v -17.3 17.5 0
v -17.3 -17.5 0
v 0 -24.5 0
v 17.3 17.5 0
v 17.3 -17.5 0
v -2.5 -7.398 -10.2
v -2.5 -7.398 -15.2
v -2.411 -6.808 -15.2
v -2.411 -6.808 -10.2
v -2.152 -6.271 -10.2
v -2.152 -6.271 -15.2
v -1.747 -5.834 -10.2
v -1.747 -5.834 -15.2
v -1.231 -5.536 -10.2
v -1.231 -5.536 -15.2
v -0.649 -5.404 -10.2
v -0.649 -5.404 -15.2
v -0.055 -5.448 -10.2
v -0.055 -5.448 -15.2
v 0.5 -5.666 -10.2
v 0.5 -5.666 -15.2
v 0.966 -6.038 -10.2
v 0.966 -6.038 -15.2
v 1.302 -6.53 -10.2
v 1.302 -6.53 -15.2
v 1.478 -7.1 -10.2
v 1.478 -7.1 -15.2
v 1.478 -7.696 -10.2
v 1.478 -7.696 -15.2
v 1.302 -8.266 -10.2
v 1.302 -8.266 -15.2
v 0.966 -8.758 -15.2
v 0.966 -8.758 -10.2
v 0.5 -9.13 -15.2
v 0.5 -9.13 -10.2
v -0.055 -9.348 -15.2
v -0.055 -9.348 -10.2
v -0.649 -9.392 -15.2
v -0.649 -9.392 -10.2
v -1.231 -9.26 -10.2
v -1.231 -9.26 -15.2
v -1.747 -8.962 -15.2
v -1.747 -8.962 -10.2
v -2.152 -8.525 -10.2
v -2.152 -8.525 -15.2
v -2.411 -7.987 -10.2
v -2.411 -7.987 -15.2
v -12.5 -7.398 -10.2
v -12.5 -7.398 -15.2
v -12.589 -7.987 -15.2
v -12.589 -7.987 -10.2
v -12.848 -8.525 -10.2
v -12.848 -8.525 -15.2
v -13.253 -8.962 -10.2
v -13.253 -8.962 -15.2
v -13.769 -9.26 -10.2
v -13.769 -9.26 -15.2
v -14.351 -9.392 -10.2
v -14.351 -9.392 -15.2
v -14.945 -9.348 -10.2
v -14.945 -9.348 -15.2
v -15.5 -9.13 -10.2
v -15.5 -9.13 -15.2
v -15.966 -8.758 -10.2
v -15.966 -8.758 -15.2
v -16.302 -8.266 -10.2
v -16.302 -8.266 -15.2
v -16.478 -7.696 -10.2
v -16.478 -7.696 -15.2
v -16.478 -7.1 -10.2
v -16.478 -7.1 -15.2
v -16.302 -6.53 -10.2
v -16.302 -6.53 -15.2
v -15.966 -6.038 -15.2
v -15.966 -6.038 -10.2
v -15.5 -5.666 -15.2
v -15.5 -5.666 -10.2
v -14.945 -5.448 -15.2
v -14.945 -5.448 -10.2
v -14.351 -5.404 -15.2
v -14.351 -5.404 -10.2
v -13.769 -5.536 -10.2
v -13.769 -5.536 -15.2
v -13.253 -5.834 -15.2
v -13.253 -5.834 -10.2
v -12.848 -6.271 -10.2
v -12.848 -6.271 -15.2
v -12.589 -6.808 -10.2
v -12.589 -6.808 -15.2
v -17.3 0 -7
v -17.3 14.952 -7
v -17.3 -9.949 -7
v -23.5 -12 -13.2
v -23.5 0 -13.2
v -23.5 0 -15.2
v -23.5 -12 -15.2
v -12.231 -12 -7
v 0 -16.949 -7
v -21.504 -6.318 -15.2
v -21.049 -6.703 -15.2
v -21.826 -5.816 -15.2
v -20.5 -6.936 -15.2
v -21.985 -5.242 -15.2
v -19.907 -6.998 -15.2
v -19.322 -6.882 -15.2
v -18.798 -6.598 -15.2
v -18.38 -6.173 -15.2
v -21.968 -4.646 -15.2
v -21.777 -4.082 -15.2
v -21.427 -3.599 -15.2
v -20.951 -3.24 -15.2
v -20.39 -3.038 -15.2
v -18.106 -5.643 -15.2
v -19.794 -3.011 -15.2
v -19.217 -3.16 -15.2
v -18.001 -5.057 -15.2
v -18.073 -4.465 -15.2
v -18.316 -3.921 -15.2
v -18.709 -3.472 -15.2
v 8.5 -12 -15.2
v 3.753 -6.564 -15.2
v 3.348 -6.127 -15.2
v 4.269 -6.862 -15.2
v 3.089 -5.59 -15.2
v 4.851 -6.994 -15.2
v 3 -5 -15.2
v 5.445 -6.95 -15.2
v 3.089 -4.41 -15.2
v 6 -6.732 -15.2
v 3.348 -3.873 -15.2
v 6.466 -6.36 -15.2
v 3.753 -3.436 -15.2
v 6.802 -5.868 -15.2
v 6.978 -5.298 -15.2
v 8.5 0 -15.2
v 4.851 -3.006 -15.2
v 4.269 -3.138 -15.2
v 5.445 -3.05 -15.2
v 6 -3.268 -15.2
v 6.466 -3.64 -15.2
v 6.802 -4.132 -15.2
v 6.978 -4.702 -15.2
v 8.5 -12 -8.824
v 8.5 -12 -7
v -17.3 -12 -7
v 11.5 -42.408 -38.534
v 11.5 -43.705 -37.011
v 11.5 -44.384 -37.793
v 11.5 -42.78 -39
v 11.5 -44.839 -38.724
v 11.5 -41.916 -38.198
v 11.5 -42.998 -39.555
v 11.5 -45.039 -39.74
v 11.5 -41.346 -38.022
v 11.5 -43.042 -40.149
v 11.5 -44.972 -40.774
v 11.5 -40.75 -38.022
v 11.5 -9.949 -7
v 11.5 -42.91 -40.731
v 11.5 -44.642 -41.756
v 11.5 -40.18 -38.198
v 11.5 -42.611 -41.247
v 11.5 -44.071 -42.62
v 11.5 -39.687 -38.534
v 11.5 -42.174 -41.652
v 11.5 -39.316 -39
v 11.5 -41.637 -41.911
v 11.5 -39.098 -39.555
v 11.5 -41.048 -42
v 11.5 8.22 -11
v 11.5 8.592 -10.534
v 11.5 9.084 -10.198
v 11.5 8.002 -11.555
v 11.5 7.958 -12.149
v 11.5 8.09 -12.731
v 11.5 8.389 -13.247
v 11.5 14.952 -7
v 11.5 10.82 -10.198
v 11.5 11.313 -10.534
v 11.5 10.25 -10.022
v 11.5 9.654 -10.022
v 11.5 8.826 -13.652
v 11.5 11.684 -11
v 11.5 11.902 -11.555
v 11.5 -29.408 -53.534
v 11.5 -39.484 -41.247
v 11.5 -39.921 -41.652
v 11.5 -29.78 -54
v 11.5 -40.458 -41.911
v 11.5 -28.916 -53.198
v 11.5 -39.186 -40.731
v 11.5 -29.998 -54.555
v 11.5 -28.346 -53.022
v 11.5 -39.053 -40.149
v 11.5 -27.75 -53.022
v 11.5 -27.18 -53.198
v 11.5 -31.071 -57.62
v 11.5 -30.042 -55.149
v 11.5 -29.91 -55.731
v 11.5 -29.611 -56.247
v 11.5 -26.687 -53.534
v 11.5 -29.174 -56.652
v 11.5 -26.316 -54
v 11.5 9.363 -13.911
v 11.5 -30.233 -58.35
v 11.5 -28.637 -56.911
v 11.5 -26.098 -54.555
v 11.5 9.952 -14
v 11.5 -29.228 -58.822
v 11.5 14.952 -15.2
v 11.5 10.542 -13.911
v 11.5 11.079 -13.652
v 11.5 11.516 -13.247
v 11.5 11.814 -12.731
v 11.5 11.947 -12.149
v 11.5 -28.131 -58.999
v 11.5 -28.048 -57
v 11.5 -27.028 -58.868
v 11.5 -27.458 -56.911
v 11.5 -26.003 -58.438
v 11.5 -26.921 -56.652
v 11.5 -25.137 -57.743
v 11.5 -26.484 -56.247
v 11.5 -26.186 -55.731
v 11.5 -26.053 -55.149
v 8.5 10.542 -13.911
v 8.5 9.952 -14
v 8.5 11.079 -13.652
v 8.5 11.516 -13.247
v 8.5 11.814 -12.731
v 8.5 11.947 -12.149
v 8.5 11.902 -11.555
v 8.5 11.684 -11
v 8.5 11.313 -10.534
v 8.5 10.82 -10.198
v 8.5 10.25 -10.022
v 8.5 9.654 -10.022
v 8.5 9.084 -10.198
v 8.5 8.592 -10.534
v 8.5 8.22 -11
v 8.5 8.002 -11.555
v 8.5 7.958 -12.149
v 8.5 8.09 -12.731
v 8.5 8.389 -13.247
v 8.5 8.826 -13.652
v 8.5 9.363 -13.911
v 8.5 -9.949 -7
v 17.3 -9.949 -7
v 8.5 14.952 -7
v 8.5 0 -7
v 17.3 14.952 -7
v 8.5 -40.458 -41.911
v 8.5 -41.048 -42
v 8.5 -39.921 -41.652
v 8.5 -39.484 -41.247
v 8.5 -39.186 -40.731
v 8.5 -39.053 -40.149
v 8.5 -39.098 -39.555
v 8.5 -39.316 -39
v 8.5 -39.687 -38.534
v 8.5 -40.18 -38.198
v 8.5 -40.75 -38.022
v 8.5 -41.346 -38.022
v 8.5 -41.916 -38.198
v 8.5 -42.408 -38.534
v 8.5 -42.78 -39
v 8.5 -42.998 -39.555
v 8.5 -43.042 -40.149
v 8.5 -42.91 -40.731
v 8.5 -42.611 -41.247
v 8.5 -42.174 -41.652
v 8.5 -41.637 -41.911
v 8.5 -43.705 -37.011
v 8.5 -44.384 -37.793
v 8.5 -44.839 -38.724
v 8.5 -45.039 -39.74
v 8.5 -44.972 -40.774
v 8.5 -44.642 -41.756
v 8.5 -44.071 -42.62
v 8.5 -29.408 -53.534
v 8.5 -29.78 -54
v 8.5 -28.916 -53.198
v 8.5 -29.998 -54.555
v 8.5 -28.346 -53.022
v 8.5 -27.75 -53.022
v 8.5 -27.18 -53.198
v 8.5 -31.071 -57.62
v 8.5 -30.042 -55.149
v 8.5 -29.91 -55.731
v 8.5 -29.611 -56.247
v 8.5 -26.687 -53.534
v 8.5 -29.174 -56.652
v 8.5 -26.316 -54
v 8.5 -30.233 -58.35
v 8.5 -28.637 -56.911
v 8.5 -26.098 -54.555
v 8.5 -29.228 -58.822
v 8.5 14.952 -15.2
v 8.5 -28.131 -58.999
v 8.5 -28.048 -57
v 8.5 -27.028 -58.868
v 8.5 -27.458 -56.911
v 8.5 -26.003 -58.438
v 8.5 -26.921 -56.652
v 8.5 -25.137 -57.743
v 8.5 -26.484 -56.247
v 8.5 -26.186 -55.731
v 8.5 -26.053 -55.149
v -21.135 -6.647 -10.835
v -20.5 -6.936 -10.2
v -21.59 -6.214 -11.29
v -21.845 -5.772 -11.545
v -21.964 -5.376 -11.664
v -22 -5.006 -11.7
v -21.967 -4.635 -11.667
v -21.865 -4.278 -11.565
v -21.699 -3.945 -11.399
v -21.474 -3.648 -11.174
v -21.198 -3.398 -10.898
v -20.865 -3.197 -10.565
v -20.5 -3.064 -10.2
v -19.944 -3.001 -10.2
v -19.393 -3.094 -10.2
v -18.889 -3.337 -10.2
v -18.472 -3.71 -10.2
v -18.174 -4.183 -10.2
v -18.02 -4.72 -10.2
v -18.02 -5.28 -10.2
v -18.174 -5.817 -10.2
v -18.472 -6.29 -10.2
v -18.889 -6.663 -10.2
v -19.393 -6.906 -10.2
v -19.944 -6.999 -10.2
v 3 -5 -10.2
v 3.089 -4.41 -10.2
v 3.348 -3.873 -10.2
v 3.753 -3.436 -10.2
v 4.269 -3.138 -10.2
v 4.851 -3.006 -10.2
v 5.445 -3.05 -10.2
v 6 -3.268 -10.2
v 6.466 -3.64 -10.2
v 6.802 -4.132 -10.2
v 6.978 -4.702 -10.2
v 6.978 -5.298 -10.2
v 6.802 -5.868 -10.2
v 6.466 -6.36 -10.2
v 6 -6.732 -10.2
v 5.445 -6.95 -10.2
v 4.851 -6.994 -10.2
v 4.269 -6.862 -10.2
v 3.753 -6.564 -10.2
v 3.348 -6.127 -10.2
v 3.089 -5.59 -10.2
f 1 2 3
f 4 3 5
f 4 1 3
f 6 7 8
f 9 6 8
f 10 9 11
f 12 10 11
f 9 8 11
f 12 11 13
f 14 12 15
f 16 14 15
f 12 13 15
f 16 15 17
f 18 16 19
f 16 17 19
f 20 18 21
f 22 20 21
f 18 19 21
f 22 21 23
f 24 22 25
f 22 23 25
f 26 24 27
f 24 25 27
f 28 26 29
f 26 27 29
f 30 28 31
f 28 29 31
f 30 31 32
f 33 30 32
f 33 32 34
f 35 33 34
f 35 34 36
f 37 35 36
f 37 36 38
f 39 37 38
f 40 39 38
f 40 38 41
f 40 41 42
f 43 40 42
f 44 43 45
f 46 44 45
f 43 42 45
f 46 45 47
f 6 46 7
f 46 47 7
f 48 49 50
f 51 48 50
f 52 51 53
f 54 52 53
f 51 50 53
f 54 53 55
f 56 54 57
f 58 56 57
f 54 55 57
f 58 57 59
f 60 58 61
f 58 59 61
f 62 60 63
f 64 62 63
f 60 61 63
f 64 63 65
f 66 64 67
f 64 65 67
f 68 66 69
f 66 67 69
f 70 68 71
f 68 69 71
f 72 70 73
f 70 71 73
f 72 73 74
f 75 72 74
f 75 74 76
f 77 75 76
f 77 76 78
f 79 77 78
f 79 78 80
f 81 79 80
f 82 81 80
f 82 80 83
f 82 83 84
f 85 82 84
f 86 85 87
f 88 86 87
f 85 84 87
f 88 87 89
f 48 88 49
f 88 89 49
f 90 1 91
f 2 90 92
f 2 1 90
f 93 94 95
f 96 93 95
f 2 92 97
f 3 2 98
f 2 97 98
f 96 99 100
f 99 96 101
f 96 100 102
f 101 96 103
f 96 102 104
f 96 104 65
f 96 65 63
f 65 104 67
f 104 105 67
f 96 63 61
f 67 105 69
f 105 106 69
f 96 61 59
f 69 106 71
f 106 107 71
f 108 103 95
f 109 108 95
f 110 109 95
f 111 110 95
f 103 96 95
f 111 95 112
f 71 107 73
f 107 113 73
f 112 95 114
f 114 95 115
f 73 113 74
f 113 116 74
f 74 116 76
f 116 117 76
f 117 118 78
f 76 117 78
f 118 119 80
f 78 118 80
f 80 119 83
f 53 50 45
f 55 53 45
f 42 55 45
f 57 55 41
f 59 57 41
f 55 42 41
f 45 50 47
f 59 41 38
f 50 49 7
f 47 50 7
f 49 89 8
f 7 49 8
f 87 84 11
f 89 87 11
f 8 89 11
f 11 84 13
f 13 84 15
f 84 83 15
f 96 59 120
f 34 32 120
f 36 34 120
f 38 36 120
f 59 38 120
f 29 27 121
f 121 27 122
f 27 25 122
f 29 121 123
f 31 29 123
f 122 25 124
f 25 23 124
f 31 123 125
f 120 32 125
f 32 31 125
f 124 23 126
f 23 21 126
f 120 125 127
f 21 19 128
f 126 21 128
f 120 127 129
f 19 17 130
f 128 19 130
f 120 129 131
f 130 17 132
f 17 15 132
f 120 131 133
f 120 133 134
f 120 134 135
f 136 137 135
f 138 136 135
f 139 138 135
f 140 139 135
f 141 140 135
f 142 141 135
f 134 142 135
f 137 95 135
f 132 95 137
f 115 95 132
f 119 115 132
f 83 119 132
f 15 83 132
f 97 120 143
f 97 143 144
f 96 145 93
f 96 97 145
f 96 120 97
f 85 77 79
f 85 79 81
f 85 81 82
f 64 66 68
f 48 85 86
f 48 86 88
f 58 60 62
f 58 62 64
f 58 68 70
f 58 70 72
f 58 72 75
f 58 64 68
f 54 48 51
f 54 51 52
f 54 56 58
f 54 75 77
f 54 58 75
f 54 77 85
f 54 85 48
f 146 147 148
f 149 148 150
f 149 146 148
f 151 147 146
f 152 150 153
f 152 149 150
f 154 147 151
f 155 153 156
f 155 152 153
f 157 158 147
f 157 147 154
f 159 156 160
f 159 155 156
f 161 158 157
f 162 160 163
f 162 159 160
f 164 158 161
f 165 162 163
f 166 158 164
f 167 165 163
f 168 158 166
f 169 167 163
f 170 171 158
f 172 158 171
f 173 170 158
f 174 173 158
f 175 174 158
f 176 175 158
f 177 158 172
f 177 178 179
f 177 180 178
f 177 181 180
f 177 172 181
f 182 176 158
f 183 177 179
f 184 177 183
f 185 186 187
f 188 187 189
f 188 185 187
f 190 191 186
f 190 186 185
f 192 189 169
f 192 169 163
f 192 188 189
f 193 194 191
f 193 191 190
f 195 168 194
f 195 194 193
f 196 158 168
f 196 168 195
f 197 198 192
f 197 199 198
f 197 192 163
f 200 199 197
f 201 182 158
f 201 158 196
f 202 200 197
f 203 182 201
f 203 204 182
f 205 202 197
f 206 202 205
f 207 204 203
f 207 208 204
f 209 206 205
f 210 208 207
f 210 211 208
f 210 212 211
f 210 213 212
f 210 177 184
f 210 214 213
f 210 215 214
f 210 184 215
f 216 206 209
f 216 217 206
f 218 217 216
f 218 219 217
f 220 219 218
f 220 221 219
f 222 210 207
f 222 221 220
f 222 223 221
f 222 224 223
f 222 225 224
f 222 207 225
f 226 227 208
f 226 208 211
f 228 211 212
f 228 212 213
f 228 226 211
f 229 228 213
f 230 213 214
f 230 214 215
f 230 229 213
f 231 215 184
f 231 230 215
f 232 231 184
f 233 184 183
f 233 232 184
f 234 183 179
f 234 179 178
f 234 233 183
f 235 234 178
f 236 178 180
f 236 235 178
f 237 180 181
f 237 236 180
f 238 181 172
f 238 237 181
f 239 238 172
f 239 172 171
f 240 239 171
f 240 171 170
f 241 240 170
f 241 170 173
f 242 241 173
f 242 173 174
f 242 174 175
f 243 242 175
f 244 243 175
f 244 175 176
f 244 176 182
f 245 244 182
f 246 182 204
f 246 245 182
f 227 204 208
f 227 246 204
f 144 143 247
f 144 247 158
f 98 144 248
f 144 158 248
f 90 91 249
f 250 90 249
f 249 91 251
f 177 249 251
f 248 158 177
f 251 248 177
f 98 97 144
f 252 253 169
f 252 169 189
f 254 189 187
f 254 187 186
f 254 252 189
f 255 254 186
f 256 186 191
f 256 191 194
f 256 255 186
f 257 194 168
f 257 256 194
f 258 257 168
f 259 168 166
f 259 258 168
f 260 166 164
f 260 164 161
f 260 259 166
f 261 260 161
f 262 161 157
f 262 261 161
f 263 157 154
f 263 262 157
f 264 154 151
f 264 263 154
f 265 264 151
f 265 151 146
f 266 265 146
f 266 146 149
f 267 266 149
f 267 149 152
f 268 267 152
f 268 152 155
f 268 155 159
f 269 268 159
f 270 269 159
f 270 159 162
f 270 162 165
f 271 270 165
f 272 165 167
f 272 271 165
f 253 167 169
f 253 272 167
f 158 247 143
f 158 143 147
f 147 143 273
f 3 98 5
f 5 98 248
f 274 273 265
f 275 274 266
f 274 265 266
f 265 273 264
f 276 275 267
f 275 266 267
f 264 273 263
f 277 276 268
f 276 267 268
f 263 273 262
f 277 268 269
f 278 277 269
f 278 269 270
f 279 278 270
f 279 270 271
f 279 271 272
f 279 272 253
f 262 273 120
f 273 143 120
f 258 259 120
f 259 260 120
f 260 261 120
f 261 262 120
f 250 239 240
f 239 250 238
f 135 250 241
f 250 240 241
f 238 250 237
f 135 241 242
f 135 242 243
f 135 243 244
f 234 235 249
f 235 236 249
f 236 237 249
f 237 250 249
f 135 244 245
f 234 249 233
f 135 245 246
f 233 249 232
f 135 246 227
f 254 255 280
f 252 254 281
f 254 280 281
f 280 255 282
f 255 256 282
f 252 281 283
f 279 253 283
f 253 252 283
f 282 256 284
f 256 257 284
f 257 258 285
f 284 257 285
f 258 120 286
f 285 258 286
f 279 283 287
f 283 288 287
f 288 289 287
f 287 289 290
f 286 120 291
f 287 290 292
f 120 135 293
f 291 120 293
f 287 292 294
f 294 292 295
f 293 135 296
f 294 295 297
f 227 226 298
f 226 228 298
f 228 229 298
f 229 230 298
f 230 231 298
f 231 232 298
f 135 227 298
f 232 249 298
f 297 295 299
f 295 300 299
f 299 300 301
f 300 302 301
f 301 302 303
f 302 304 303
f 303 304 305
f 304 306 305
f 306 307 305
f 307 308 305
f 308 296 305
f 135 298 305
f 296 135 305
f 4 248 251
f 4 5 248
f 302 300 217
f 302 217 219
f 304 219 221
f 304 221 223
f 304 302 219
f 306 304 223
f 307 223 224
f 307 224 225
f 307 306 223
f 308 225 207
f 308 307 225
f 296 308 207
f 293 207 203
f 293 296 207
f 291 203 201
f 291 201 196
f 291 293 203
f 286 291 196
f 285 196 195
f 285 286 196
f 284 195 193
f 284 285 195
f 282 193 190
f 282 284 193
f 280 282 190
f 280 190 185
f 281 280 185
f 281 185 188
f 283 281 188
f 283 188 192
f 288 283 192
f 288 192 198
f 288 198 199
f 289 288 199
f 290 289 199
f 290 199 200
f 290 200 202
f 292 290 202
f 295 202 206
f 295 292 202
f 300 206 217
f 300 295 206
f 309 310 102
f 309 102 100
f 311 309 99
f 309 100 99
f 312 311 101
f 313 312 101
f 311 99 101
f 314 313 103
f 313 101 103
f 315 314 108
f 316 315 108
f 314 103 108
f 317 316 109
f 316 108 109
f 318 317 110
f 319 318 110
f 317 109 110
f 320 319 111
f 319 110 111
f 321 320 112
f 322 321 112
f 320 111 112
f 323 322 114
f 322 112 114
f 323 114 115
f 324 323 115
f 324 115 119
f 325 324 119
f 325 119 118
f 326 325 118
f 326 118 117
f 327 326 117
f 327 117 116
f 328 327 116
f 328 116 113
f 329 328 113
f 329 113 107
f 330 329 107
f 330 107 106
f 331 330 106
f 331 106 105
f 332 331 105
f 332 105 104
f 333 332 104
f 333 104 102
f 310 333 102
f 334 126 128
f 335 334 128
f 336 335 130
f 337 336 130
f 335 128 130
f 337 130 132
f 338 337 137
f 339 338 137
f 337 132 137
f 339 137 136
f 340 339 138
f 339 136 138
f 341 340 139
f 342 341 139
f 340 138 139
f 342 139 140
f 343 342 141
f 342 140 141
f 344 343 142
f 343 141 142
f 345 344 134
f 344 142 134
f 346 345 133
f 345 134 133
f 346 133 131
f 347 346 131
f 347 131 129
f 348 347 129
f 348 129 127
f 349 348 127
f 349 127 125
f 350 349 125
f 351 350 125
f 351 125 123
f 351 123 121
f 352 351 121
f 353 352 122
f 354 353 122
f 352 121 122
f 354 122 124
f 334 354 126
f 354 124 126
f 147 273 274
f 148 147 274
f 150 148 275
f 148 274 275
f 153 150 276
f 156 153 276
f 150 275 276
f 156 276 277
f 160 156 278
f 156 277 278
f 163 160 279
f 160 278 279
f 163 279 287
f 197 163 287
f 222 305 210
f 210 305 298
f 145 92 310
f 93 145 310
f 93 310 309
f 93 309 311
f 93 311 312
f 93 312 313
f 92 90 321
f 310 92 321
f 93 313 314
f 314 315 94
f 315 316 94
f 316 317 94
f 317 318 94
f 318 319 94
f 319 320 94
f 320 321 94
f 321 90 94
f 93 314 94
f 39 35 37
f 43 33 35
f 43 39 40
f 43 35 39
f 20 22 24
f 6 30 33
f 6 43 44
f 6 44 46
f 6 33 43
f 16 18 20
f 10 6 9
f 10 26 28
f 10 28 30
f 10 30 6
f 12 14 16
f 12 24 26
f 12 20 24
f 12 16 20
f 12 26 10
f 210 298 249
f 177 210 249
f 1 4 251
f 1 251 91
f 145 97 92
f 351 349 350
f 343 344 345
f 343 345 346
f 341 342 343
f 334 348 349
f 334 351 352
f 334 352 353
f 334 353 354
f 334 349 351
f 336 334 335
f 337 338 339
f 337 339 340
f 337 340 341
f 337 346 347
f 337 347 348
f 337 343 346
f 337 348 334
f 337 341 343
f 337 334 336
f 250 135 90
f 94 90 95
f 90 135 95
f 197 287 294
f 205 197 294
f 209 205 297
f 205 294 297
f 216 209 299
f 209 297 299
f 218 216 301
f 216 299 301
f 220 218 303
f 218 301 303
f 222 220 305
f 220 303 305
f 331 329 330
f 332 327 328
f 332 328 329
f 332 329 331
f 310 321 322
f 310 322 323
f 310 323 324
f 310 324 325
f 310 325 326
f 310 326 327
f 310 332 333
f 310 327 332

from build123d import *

# Parameters (mm, degrees)
RESSALTO_EXTRUS_O4_DEPTH = 7
CHANFRO1_SIZE            = 7
CHANFRO2_SIZE2           = 7
CHANFRO2_SIZE            = 2.54779164
RESSALTO_EXTRUS_O5_DEPTH = 12
ESBO_O13_R               = 2
CORTE_EXTRUS_O1_DEPTH    = 5
ESBO_O14_R               = 2
RESSALTO_EXTRUS_O6_DEPTH = 3


with BuildPart() as part:
    # Esboço10 → Ressalto-extrusão4 (new body)
    with BuildSketch(Plane.XY):
        Polygon((-17.3, -17.5), (0, -24.5), (17.3, -17.5), (17.3, 17.5), (-17.3, 17.5), align=None)
    extrude(amount=-RESSALTO_EXTRUS_O4_DEPTH)

    # Chanfro1
    chanfro1_edges = [part.edges().sort_by_distance(p)[0] for p in [
        (-8.65, -21, -7),
        (8.65, -21, -7),
    ]]
    chamfer(chanfro1_edges, length=CHANFRO1_SIZE - 0.0001)  # a hair under: the kernel refuses the full size

    # Chanfro2
    chanfro2_edges = [part.edges().sort_by_distance(p)[0] for p in [
        (0, 17.5, -7),
    ]]
    chanfro2_side = [part.faces().sort_by_distance(p)[0] for p in [
        (0, 17.449044167, -7),
    ]]
    chamfer(chanfro2_edges, length=CHANFRO2_SIZE - 0.0001, length2=CHANFRO2_SIZE2 - 0.0001, reference=chanfro2_side[0])  # a hair under: the kernel refuses the full size

    # Esboço12 → Ressalto-extrusão5 (add)
    with BuildSketch(Plane(origin=(0, 0, 0), x_dir=(1, 0, 0), z_dir=(0, 1, 0))):
        Polygon((-17.3, 7), (-23.5, 13.2), (-23.5, 15.2), (8.5, 15.2), (8.5, 7), align=None)
    extrude(amount=-RESSALTO_EXTRUS_O5_DEPTH)

    # Esboço13 → Corte-extrusão1 (cut)
    with BuildSketch(Plane(origin=(0, 0, -15.2), x_dir=(-1, 0, 0), z_dir=(0, 0, -1))):
        with Locations((0.5, -7.397915762)):
            Circle(ESBO_O13_R)
        with Locations((-5, -5)):
            Circle(ESBO_O13_R)
        with Locations(Location((20, -5, 0), (0, 0, 284.477512186))):
            Circle(ESBO_O13_R)
        with Locations(Location((14.5, -7.397915762, 0), (0, 0, 180))):
            Circle(ESBO_O13_R)
    extrude(amount=-CORTE_EXTRUS_O1_DEPTH, mode=Mode.SUBTRACT)

    # Esboço14 → Ressalto-extrusão6 (add)
    with BuildSketch(Plane(origin=(8.5, 0, 0), x_dir=(0, 0, -1), z_dir=(1, 0, 0))):
        with BuildLine():
            Line((57.743206586, -25.136637637), (15.2, 14.95220836))
            Line((15.2, 14.95220836), (7, 14.95220836))
            Line((7, 14.95220836), (7, -9.948687565))
            Line((7, -9.948687565), (37.010562028, -43.705471194))
            ThreePointArc((37.010562028, -43.705471194), (39.740206409, -45.039346135), (42.619722154, -44.070547971))
            Line((42.619722154, -44.070547971), (57.619722154, -31.070547971))
            ThreePointArc((57.619722154, -31.070547971), (58.999134172, -28.131013459), (57.743206586, -25.136637637))
        make_face()
        with Locations((12, 9.95220836)):
            Circle(ESBO_O14_R, mode=Mode.SUBTRACT)
        with Locations((55, -28.04779164)):
            Circle(ESBO_O14_R, mode=Mode.SUBTRACT)
        with Locations((40, -41.04779164)):
            Circle(ESBO_O14_R, mode=Mode.SUBTRACT)
    extrude(amount=RESSALTO_EXTRUS_O6_DEPTH)


solid = part.part
